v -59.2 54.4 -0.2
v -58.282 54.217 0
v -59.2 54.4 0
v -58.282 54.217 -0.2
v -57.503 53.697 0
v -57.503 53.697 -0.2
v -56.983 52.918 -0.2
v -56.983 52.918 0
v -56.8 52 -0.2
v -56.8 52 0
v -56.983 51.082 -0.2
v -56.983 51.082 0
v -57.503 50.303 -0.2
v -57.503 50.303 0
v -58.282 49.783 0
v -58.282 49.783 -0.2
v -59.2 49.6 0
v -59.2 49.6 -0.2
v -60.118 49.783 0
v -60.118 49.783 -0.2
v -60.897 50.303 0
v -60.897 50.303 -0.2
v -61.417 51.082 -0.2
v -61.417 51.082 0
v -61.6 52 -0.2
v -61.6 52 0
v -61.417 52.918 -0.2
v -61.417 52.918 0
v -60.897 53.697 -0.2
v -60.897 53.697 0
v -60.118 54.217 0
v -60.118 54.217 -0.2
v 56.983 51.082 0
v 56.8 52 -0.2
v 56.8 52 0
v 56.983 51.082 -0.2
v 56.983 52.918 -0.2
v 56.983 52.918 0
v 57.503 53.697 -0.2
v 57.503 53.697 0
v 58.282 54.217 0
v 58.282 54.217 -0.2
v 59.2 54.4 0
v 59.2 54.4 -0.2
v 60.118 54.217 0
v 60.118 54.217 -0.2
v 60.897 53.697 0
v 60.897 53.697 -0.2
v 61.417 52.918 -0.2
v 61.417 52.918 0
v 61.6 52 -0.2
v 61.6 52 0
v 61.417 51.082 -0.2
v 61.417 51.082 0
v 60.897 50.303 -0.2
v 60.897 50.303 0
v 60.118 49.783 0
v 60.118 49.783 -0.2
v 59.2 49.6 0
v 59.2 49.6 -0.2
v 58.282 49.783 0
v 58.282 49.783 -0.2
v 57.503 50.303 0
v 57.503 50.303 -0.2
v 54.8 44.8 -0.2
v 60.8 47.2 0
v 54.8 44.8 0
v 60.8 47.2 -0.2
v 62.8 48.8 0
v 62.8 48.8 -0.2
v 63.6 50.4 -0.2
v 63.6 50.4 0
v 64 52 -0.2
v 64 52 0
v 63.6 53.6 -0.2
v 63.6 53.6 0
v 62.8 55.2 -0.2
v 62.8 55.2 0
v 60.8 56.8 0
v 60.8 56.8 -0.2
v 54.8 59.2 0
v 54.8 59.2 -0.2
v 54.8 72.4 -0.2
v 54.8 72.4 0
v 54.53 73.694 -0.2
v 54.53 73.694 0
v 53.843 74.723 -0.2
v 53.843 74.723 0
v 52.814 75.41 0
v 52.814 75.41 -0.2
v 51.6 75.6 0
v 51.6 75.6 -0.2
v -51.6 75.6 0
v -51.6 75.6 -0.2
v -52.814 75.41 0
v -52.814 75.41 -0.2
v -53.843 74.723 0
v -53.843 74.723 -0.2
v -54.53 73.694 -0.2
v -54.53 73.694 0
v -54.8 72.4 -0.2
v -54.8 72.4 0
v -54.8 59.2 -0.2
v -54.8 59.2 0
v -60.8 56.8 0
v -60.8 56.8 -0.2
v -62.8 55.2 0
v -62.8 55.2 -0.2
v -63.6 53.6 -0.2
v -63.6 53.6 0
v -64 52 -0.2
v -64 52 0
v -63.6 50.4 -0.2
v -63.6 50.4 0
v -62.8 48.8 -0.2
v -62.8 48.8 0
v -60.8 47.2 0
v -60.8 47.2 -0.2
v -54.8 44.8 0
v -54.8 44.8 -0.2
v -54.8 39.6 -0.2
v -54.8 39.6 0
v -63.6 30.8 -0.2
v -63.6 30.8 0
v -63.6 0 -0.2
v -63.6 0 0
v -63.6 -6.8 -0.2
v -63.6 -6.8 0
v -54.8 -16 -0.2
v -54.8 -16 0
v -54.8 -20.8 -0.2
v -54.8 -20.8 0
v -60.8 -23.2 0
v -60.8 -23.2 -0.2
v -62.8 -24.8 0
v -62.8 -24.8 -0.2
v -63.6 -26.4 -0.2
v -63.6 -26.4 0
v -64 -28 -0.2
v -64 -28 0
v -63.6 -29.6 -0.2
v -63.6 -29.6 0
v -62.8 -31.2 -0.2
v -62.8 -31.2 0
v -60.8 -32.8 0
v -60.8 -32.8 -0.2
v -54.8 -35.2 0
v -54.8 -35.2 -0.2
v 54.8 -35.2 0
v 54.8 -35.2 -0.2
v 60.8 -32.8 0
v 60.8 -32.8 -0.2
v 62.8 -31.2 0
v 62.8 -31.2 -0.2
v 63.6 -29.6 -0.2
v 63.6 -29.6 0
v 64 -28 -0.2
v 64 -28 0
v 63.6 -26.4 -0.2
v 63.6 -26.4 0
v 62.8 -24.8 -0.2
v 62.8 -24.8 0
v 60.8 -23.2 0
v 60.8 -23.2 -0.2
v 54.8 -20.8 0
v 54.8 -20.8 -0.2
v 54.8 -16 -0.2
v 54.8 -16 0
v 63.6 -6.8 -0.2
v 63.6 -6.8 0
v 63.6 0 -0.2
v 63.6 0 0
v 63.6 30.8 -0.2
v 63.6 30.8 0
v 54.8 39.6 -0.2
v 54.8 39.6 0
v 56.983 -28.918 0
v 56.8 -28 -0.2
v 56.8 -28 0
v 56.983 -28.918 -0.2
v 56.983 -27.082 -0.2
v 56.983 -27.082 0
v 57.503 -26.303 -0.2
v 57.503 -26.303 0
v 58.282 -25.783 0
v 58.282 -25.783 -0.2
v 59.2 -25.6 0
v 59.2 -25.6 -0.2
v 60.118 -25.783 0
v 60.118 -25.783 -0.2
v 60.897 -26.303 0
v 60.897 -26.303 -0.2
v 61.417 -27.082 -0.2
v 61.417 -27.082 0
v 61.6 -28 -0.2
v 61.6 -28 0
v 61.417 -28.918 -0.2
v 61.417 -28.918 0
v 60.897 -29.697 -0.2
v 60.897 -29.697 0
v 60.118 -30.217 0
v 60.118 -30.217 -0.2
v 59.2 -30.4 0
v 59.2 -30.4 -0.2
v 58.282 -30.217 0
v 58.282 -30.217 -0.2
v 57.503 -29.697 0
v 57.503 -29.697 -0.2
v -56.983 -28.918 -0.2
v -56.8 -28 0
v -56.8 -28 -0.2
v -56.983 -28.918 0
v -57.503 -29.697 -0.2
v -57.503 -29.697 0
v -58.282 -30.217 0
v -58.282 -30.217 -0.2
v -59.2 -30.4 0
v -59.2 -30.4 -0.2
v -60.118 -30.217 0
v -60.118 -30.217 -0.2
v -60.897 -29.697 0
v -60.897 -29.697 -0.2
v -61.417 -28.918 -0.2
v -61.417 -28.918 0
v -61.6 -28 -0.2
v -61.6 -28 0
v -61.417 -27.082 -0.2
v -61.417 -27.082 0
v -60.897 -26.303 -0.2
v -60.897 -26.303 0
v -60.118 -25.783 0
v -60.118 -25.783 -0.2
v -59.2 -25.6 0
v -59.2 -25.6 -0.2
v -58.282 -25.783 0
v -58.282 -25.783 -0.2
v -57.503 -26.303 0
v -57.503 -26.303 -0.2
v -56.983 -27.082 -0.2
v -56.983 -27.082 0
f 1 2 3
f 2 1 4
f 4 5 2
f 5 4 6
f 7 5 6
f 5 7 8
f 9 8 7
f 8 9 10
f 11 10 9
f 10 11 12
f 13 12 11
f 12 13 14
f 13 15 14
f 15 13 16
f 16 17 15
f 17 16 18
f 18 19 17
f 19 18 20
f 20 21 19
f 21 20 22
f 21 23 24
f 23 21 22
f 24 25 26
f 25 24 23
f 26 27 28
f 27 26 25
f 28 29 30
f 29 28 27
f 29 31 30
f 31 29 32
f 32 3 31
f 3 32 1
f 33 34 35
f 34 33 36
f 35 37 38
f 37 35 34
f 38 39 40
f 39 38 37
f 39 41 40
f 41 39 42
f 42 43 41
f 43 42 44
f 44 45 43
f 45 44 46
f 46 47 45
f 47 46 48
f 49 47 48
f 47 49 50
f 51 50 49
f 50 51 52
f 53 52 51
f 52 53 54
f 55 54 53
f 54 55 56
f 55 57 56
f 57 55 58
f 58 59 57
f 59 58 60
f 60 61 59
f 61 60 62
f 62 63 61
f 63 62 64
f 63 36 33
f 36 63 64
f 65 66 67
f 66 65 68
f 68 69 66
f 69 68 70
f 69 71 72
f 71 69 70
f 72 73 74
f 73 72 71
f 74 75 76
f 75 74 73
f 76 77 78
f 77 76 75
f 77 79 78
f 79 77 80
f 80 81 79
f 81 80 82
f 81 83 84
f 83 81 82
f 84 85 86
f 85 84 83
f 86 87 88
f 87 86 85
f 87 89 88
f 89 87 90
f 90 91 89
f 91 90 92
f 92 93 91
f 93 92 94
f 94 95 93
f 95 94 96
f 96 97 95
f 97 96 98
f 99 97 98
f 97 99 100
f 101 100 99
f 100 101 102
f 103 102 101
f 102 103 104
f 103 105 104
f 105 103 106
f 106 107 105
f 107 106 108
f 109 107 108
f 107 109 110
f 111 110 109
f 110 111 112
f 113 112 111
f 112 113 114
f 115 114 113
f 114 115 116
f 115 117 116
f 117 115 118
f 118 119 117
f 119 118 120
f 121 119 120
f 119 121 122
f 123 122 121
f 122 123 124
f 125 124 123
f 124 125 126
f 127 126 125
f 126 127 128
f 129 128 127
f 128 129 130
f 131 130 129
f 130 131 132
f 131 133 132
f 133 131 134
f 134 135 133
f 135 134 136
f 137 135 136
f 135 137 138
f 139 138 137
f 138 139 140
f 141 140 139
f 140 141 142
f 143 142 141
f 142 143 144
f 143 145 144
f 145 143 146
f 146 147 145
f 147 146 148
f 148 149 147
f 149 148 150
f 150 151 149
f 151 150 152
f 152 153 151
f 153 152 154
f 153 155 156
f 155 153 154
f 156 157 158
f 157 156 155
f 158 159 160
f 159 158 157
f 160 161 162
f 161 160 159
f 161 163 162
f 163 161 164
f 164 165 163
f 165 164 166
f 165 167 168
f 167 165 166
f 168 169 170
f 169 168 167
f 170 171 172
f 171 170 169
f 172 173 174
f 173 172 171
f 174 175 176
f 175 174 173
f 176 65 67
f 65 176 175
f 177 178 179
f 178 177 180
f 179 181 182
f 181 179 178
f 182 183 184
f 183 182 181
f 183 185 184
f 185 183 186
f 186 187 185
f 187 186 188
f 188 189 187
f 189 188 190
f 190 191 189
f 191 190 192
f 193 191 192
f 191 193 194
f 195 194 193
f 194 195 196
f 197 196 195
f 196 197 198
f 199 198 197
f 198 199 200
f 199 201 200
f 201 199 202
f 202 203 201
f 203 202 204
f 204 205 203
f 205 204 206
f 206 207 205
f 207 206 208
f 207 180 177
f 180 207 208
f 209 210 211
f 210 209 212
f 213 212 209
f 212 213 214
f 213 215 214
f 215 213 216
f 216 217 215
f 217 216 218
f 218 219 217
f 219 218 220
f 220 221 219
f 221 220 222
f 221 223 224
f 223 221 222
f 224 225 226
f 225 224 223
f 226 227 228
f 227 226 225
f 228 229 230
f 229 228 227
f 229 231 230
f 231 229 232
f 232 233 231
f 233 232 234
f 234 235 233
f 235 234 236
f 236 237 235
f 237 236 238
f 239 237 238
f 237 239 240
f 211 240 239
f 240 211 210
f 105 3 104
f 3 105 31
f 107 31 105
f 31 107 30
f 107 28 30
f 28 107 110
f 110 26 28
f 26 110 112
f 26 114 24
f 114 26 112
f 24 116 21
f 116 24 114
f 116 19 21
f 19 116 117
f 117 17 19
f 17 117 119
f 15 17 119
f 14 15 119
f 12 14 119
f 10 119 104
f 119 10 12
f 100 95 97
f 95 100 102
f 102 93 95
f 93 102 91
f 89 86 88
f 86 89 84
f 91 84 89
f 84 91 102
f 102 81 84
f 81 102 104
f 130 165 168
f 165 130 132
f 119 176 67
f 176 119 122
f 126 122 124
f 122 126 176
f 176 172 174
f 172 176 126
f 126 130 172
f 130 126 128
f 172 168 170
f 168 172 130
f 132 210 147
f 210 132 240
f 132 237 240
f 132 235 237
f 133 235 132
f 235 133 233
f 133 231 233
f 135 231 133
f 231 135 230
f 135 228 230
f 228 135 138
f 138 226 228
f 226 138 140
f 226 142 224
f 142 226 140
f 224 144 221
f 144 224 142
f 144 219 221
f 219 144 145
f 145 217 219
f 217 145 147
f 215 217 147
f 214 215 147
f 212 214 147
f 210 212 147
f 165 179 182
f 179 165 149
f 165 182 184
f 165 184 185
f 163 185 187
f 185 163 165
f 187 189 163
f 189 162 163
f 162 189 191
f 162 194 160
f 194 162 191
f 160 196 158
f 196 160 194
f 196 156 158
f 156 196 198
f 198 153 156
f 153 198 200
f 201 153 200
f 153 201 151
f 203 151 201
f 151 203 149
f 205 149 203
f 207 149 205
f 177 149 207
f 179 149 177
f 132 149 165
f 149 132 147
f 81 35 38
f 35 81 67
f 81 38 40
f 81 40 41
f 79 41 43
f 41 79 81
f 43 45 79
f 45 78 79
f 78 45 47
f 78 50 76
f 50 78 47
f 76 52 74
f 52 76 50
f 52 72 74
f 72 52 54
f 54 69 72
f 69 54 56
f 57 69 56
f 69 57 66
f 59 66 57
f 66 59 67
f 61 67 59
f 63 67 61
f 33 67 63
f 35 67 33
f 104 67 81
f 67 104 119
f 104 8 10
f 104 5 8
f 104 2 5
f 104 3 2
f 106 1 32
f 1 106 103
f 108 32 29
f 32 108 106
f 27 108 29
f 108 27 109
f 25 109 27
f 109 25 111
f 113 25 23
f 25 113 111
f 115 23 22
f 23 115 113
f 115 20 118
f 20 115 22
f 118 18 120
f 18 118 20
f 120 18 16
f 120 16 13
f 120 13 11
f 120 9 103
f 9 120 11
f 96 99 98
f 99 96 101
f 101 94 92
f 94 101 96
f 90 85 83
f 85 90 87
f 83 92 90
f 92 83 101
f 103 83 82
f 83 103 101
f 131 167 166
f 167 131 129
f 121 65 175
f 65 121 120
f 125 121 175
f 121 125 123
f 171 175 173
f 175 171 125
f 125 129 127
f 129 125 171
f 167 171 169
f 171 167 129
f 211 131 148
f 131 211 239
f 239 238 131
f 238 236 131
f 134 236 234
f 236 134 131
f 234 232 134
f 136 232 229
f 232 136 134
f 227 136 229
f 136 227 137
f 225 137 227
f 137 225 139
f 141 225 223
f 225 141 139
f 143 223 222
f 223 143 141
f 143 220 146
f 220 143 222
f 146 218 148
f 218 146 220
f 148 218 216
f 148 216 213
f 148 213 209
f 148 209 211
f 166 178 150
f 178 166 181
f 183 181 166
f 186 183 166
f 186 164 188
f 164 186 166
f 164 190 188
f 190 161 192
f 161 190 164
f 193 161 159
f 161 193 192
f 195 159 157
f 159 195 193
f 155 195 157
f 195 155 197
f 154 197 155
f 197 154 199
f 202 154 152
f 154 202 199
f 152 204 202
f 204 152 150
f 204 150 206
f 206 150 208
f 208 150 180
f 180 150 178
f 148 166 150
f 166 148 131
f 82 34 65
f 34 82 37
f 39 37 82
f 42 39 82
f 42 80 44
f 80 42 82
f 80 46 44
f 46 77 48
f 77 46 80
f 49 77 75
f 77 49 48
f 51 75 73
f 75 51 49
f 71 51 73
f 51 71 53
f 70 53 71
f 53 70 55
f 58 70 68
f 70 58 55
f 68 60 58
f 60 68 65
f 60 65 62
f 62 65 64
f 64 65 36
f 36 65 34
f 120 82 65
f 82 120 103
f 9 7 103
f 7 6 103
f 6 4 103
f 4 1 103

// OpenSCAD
use <../lib.scad>
use <s/u9331s01.scad>
use <s/u9331s02.scad>
function ldraw_lib__28884() = [
// 0 Cardboard Ramp 16 x 14 with Yellow Curbs and Chevrons Pattern
// 0 Name: 28884.dat
// 0 Author: Philippe Hurbain [Philo]
// 0 !LDRAW_ORG Part UPDATE 2024-03
// 0 !LICENSE Licensed under CC BY 4.0 : see CAreadme.txt
// 
// 0 BFC CERTIFY CCW
  [0,"BFC","CERTIFY"],
  [0,"BFC","CCW"],
// 
// 0 !CATEGORY Sheet Cardboard
// 0 !KEYWORDS BrickLink 42058ppr01, Set 42058, Stunt Bike
// 
// 0 !HISTORY 2024-04-28 [OrionP] Official Update 2024-03
// 
// 
// 1 16 0 0 0 1 0 0 0 1 0 0 0 1 s\u9331s01.dat
  [1,16,0,0,0,1,0,0,0,1,0,0,0,1, ldraw_lib__s__u9331s01()],
// 0 !TEXMAP START PLANAR -160 0 189 160 0 189 -160 0 -88 28884.png
// 0 !: 1 16 0 0 0 1 0 0 0 1 0 0 0 1 s\u9331s02.dat
// 0 !TEXMAP FALLBACK
// 1 16 0 0 0 1 0 0 0 1 0 0 0 1 s\u9331s02.dat
  [1,16,0,0,0,1,0,0,0,1,0,0,0,1, ldraw_lib__s__u9331s02()],
// 0 !TEXMAP END
// 1 16 0 0.5 0 1 0 0 0 -1 0 0 0 1 s\u9331s02.dat
  [1,16,0,0.5,0,1,0,0,0,-1,0,0,0,1, ldraw_lib__s__u9331s02()],
];
module ldraw_lib__28884(step=0, col=false, unit=2/5, alt=false, line=0.2, solid=!$preview)
    makepoly(ldraw_lib__28884(), step=step, col=col, unit=unit, alt=alt, line=line, solid=solid);
ldraw_lib__28884(line=0.2);
